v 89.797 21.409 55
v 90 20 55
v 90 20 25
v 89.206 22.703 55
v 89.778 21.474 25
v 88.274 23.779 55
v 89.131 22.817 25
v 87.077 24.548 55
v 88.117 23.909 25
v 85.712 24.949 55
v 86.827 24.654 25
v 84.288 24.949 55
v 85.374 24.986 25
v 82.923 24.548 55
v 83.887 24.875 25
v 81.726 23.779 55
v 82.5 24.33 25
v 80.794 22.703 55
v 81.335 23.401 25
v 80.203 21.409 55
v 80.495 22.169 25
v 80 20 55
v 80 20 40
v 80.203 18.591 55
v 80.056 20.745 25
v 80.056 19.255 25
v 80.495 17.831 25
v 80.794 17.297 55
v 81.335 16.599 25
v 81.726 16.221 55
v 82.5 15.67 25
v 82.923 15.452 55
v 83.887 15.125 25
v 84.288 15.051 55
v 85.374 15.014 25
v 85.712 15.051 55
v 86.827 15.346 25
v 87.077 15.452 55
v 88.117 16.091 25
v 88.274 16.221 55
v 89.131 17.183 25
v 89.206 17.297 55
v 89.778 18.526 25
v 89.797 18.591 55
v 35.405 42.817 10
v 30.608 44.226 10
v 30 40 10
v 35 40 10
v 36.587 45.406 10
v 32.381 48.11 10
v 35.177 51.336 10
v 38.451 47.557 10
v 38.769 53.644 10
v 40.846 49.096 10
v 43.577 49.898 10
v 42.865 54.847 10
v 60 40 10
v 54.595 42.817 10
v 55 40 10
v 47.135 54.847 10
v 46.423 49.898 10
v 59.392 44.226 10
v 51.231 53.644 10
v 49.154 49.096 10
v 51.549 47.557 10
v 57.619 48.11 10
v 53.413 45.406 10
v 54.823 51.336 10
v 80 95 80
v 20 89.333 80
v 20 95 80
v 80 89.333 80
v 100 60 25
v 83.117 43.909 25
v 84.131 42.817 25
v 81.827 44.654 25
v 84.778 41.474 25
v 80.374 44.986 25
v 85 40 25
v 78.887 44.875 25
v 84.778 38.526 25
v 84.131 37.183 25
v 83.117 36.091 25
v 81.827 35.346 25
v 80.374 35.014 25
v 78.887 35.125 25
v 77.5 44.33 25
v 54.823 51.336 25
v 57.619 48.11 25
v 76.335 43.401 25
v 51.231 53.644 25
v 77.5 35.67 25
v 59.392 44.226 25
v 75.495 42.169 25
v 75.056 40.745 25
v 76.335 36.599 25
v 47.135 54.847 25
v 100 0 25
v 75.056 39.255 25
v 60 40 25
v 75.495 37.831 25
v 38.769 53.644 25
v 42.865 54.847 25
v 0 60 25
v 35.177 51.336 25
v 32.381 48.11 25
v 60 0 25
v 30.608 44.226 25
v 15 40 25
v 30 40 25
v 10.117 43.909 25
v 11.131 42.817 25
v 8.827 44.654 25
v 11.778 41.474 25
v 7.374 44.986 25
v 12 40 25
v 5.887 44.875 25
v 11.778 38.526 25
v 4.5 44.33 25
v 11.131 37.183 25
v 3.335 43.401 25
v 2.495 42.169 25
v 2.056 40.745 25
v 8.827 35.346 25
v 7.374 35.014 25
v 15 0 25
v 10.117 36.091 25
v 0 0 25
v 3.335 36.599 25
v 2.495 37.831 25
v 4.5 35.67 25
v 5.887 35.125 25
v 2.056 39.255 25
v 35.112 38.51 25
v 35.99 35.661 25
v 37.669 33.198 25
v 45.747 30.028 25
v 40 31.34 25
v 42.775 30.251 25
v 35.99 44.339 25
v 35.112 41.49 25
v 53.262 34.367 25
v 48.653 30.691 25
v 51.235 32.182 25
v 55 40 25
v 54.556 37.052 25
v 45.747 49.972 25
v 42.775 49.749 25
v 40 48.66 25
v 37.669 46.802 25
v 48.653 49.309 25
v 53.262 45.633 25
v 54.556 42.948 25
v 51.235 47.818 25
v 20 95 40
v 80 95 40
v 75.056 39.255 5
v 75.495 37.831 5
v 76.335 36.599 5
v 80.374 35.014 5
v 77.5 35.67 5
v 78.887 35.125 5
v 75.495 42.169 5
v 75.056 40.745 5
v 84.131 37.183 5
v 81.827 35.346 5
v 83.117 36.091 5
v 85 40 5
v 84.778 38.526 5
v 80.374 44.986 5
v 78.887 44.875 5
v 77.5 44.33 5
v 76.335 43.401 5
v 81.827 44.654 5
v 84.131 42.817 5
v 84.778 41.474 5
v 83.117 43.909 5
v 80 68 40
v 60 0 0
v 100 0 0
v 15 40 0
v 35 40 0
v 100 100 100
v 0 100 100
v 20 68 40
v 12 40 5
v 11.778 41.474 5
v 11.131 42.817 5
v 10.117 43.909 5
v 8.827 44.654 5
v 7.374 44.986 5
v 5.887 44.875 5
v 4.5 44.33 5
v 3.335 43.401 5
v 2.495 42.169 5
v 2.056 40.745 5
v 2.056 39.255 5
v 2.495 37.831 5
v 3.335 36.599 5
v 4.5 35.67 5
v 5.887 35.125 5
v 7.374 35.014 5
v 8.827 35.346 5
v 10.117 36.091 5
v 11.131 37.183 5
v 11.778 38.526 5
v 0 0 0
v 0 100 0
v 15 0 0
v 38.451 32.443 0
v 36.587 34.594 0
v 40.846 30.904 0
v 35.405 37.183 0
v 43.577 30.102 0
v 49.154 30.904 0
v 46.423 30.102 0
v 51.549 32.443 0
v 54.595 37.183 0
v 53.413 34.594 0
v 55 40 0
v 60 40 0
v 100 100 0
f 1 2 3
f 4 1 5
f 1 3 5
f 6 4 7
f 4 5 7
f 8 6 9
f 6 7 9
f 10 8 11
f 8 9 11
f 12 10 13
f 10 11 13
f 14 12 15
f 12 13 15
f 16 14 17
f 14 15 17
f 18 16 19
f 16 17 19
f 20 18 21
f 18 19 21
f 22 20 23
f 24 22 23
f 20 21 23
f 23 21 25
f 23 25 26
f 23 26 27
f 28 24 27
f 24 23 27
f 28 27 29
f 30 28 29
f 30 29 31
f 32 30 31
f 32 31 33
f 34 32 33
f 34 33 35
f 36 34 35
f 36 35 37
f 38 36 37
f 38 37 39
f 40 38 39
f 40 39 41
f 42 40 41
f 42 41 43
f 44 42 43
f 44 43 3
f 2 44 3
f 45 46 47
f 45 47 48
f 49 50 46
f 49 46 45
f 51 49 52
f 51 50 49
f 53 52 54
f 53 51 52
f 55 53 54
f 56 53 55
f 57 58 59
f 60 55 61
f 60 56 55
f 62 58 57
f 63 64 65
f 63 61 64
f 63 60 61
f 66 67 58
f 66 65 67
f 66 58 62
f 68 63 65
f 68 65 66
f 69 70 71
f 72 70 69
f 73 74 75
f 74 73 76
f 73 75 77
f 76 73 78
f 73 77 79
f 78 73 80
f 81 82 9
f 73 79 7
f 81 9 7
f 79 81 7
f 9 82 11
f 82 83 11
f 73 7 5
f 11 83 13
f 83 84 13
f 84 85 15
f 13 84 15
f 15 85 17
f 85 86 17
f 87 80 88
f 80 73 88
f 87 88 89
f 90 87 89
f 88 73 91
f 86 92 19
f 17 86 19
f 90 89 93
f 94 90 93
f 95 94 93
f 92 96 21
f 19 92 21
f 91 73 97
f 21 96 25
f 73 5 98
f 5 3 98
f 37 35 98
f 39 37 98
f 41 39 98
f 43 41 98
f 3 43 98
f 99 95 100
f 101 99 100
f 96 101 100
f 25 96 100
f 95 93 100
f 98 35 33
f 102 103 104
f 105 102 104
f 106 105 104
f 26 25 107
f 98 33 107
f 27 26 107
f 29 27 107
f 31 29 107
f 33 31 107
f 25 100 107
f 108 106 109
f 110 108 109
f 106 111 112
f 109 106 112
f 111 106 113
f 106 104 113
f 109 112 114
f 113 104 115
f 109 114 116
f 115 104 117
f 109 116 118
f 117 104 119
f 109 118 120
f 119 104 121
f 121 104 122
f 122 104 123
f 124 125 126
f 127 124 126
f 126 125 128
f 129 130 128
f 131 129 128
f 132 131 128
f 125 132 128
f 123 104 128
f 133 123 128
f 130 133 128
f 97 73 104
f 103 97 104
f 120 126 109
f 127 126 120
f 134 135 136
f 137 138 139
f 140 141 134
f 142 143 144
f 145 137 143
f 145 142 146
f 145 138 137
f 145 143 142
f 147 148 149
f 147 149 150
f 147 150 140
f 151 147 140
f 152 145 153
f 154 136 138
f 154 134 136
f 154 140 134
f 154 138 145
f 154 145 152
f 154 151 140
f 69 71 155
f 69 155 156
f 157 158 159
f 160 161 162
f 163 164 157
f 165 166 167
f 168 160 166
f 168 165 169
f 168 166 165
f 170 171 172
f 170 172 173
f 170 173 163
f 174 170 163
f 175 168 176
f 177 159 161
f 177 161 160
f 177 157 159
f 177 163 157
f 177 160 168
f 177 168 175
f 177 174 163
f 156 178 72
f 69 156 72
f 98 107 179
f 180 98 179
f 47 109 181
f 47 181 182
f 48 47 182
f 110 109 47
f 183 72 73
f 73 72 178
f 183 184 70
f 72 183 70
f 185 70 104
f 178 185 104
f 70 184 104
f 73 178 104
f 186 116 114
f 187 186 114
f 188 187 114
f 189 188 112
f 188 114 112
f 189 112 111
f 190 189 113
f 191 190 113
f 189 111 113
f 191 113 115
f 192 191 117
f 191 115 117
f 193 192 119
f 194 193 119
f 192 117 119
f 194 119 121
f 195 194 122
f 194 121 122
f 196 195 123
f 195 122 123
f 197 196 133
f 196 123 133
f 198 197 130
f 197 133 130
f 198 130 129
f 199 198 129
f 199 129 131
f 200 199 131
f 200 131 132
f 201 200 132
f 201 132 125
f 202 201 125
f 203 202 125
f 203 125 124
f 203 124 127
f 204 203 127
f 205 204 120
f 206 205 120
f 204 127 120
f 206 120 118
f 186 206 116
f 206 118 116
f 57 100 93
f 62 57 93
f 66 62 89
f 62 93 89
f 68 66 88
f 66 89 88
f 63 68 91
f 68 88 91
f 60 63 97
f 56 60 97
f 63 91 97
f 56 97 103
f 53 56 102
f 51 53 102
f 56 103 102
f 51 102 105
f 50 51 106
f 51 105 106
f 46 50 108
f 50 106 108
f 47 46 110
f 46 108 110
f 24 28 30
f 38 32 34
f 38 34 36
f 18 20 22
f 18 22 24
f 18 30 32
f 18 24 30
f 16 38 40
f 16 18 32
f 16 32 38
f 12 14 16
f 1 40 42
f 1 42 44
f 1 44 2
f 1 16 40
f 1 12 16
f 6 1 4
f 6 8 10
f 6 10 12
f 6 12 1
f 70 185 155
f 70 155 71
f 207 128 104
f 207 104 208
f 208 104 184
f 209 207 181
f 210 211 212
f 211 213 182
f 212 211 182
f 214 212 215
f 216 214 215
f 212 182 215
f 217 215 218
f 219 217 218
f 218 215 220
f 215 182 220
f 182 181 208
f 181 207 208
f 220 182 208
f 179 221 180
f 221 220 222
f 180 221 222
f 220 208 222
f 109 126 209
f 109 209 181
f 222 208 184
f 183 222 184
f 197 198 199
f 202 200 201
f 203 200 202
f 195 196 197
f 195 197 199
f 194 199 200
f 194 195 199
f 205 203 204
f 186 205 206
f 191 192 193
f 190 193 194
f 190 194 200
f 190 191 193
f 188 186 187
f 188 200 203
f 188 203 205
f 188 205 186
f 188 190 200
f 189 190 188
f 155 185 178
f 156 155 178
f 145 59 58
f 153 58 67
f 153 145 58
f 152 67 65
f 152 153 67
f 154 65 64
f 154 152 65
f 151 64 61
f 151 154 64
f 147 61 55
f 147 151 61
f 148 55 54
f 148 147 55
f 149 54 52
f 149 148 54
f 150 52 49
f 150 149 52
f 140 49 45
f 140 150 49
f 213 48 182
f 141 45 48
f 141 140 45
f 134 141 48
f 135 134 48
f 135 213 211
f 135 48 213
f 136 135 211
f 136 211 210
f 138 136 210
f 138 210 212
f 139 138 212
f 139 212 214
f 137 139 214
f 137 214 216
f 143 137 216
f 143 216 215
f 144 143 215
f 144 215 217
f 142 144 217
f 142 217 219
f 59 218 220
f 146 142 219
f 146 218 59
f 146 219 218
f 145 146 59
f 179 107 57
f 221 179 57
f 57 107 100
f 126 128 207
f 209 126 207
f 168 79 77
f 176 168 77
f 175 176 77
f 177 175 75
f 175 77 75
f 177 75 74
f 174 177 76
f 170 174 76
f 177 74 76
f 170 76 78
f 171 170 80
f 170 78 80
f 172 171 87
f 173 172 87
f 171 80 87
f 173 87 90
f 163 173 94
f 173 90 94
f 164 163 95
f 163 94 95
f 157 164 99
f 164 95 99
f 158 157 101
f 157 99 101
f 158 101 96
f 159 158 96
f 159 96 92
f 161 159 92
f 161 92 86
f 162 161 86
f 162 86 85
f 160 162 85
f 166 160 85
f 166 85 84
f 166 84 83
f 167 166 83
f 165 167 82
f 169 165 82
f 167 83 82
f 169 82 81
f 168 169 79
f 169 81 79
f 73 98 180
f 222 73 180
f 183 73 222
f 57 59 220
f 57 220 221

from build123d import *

# Parameters (mm, degrees)
F1_DEPTH  = 100
F2_R      = 5
F3_DEPTH  = 30
F4_R      = 5
F5_DEPTH  = 20
F6_W      = 60
F6_H      = 40
F7_DEPTH  = 95
F8_W      = 45
F8_H      = 40
F9_DEPTH  = 25
F10_R     = 15
F11_DEPTH = 15
F12_R     = 10
F13_DEPTH = 25


with BuildPart() as f1:
    # F0 (on Right) → F1 (new body)
    with BuildSketch(Plane.YZ):
        Polygon((0, 25), (0, 0), (100, 0), (100, 100), (60, 25), align=None)
    extrude(amount=F1_DEPTH)

    # F2 (on face) → F3 (join)
    with BuildSketch(Plane.XY.offset(25)):
        with Locations((85, 20)):
            Circle(F2_R)
    extrude(amount=F3_DEPTH)

    # F4 (on face) → F5 (cut)
    with BuildSketch(Plane.XY.offset(25)):
        with Locations((7, 40)):
            Circle(F4_R)
        with Locations((80, 40)):
            Circle(F4_R)
    extrude(amount=-F5_DEPTH, mode=Mode.SUBTRACT)

    # F6 (on Front) → F7 (cut)
    with BuildSketch(Plane.XZ):
        with Locations((50, 60)):
            Rectangle(F6_W, F6_H)
    extrude(amount=-F7_DEPTH, mode=Mode.SUBTRACT)

    # F8 (on face) → F9 (cut)
    with BuildSketch(Plane.XY.offset(25)):
        with Locations((37.5, 20)):
            Rectangle(F8_W, F8_H)
    extrude(amount=-F9_DEPTH, mode=Mode.SUBTRACT)

    # F10 (on face) → F11 (cut)
    with BuildSketch(Plane.XY.offset(25)):
        with Locations((45, 40)):
            Circle(F10_R)
    extrude(amount=-F11_DEPTH, mode=Mode.SUBTRACT)

    # F12 (on face) → F13 (join)
    with BuildSketch(Plane.XY.offset(25)):
        with Locations((45, 40)):
            Circle(F12_R)
    extrude(amount=-F13_DEPTH)


solid = f1.part
